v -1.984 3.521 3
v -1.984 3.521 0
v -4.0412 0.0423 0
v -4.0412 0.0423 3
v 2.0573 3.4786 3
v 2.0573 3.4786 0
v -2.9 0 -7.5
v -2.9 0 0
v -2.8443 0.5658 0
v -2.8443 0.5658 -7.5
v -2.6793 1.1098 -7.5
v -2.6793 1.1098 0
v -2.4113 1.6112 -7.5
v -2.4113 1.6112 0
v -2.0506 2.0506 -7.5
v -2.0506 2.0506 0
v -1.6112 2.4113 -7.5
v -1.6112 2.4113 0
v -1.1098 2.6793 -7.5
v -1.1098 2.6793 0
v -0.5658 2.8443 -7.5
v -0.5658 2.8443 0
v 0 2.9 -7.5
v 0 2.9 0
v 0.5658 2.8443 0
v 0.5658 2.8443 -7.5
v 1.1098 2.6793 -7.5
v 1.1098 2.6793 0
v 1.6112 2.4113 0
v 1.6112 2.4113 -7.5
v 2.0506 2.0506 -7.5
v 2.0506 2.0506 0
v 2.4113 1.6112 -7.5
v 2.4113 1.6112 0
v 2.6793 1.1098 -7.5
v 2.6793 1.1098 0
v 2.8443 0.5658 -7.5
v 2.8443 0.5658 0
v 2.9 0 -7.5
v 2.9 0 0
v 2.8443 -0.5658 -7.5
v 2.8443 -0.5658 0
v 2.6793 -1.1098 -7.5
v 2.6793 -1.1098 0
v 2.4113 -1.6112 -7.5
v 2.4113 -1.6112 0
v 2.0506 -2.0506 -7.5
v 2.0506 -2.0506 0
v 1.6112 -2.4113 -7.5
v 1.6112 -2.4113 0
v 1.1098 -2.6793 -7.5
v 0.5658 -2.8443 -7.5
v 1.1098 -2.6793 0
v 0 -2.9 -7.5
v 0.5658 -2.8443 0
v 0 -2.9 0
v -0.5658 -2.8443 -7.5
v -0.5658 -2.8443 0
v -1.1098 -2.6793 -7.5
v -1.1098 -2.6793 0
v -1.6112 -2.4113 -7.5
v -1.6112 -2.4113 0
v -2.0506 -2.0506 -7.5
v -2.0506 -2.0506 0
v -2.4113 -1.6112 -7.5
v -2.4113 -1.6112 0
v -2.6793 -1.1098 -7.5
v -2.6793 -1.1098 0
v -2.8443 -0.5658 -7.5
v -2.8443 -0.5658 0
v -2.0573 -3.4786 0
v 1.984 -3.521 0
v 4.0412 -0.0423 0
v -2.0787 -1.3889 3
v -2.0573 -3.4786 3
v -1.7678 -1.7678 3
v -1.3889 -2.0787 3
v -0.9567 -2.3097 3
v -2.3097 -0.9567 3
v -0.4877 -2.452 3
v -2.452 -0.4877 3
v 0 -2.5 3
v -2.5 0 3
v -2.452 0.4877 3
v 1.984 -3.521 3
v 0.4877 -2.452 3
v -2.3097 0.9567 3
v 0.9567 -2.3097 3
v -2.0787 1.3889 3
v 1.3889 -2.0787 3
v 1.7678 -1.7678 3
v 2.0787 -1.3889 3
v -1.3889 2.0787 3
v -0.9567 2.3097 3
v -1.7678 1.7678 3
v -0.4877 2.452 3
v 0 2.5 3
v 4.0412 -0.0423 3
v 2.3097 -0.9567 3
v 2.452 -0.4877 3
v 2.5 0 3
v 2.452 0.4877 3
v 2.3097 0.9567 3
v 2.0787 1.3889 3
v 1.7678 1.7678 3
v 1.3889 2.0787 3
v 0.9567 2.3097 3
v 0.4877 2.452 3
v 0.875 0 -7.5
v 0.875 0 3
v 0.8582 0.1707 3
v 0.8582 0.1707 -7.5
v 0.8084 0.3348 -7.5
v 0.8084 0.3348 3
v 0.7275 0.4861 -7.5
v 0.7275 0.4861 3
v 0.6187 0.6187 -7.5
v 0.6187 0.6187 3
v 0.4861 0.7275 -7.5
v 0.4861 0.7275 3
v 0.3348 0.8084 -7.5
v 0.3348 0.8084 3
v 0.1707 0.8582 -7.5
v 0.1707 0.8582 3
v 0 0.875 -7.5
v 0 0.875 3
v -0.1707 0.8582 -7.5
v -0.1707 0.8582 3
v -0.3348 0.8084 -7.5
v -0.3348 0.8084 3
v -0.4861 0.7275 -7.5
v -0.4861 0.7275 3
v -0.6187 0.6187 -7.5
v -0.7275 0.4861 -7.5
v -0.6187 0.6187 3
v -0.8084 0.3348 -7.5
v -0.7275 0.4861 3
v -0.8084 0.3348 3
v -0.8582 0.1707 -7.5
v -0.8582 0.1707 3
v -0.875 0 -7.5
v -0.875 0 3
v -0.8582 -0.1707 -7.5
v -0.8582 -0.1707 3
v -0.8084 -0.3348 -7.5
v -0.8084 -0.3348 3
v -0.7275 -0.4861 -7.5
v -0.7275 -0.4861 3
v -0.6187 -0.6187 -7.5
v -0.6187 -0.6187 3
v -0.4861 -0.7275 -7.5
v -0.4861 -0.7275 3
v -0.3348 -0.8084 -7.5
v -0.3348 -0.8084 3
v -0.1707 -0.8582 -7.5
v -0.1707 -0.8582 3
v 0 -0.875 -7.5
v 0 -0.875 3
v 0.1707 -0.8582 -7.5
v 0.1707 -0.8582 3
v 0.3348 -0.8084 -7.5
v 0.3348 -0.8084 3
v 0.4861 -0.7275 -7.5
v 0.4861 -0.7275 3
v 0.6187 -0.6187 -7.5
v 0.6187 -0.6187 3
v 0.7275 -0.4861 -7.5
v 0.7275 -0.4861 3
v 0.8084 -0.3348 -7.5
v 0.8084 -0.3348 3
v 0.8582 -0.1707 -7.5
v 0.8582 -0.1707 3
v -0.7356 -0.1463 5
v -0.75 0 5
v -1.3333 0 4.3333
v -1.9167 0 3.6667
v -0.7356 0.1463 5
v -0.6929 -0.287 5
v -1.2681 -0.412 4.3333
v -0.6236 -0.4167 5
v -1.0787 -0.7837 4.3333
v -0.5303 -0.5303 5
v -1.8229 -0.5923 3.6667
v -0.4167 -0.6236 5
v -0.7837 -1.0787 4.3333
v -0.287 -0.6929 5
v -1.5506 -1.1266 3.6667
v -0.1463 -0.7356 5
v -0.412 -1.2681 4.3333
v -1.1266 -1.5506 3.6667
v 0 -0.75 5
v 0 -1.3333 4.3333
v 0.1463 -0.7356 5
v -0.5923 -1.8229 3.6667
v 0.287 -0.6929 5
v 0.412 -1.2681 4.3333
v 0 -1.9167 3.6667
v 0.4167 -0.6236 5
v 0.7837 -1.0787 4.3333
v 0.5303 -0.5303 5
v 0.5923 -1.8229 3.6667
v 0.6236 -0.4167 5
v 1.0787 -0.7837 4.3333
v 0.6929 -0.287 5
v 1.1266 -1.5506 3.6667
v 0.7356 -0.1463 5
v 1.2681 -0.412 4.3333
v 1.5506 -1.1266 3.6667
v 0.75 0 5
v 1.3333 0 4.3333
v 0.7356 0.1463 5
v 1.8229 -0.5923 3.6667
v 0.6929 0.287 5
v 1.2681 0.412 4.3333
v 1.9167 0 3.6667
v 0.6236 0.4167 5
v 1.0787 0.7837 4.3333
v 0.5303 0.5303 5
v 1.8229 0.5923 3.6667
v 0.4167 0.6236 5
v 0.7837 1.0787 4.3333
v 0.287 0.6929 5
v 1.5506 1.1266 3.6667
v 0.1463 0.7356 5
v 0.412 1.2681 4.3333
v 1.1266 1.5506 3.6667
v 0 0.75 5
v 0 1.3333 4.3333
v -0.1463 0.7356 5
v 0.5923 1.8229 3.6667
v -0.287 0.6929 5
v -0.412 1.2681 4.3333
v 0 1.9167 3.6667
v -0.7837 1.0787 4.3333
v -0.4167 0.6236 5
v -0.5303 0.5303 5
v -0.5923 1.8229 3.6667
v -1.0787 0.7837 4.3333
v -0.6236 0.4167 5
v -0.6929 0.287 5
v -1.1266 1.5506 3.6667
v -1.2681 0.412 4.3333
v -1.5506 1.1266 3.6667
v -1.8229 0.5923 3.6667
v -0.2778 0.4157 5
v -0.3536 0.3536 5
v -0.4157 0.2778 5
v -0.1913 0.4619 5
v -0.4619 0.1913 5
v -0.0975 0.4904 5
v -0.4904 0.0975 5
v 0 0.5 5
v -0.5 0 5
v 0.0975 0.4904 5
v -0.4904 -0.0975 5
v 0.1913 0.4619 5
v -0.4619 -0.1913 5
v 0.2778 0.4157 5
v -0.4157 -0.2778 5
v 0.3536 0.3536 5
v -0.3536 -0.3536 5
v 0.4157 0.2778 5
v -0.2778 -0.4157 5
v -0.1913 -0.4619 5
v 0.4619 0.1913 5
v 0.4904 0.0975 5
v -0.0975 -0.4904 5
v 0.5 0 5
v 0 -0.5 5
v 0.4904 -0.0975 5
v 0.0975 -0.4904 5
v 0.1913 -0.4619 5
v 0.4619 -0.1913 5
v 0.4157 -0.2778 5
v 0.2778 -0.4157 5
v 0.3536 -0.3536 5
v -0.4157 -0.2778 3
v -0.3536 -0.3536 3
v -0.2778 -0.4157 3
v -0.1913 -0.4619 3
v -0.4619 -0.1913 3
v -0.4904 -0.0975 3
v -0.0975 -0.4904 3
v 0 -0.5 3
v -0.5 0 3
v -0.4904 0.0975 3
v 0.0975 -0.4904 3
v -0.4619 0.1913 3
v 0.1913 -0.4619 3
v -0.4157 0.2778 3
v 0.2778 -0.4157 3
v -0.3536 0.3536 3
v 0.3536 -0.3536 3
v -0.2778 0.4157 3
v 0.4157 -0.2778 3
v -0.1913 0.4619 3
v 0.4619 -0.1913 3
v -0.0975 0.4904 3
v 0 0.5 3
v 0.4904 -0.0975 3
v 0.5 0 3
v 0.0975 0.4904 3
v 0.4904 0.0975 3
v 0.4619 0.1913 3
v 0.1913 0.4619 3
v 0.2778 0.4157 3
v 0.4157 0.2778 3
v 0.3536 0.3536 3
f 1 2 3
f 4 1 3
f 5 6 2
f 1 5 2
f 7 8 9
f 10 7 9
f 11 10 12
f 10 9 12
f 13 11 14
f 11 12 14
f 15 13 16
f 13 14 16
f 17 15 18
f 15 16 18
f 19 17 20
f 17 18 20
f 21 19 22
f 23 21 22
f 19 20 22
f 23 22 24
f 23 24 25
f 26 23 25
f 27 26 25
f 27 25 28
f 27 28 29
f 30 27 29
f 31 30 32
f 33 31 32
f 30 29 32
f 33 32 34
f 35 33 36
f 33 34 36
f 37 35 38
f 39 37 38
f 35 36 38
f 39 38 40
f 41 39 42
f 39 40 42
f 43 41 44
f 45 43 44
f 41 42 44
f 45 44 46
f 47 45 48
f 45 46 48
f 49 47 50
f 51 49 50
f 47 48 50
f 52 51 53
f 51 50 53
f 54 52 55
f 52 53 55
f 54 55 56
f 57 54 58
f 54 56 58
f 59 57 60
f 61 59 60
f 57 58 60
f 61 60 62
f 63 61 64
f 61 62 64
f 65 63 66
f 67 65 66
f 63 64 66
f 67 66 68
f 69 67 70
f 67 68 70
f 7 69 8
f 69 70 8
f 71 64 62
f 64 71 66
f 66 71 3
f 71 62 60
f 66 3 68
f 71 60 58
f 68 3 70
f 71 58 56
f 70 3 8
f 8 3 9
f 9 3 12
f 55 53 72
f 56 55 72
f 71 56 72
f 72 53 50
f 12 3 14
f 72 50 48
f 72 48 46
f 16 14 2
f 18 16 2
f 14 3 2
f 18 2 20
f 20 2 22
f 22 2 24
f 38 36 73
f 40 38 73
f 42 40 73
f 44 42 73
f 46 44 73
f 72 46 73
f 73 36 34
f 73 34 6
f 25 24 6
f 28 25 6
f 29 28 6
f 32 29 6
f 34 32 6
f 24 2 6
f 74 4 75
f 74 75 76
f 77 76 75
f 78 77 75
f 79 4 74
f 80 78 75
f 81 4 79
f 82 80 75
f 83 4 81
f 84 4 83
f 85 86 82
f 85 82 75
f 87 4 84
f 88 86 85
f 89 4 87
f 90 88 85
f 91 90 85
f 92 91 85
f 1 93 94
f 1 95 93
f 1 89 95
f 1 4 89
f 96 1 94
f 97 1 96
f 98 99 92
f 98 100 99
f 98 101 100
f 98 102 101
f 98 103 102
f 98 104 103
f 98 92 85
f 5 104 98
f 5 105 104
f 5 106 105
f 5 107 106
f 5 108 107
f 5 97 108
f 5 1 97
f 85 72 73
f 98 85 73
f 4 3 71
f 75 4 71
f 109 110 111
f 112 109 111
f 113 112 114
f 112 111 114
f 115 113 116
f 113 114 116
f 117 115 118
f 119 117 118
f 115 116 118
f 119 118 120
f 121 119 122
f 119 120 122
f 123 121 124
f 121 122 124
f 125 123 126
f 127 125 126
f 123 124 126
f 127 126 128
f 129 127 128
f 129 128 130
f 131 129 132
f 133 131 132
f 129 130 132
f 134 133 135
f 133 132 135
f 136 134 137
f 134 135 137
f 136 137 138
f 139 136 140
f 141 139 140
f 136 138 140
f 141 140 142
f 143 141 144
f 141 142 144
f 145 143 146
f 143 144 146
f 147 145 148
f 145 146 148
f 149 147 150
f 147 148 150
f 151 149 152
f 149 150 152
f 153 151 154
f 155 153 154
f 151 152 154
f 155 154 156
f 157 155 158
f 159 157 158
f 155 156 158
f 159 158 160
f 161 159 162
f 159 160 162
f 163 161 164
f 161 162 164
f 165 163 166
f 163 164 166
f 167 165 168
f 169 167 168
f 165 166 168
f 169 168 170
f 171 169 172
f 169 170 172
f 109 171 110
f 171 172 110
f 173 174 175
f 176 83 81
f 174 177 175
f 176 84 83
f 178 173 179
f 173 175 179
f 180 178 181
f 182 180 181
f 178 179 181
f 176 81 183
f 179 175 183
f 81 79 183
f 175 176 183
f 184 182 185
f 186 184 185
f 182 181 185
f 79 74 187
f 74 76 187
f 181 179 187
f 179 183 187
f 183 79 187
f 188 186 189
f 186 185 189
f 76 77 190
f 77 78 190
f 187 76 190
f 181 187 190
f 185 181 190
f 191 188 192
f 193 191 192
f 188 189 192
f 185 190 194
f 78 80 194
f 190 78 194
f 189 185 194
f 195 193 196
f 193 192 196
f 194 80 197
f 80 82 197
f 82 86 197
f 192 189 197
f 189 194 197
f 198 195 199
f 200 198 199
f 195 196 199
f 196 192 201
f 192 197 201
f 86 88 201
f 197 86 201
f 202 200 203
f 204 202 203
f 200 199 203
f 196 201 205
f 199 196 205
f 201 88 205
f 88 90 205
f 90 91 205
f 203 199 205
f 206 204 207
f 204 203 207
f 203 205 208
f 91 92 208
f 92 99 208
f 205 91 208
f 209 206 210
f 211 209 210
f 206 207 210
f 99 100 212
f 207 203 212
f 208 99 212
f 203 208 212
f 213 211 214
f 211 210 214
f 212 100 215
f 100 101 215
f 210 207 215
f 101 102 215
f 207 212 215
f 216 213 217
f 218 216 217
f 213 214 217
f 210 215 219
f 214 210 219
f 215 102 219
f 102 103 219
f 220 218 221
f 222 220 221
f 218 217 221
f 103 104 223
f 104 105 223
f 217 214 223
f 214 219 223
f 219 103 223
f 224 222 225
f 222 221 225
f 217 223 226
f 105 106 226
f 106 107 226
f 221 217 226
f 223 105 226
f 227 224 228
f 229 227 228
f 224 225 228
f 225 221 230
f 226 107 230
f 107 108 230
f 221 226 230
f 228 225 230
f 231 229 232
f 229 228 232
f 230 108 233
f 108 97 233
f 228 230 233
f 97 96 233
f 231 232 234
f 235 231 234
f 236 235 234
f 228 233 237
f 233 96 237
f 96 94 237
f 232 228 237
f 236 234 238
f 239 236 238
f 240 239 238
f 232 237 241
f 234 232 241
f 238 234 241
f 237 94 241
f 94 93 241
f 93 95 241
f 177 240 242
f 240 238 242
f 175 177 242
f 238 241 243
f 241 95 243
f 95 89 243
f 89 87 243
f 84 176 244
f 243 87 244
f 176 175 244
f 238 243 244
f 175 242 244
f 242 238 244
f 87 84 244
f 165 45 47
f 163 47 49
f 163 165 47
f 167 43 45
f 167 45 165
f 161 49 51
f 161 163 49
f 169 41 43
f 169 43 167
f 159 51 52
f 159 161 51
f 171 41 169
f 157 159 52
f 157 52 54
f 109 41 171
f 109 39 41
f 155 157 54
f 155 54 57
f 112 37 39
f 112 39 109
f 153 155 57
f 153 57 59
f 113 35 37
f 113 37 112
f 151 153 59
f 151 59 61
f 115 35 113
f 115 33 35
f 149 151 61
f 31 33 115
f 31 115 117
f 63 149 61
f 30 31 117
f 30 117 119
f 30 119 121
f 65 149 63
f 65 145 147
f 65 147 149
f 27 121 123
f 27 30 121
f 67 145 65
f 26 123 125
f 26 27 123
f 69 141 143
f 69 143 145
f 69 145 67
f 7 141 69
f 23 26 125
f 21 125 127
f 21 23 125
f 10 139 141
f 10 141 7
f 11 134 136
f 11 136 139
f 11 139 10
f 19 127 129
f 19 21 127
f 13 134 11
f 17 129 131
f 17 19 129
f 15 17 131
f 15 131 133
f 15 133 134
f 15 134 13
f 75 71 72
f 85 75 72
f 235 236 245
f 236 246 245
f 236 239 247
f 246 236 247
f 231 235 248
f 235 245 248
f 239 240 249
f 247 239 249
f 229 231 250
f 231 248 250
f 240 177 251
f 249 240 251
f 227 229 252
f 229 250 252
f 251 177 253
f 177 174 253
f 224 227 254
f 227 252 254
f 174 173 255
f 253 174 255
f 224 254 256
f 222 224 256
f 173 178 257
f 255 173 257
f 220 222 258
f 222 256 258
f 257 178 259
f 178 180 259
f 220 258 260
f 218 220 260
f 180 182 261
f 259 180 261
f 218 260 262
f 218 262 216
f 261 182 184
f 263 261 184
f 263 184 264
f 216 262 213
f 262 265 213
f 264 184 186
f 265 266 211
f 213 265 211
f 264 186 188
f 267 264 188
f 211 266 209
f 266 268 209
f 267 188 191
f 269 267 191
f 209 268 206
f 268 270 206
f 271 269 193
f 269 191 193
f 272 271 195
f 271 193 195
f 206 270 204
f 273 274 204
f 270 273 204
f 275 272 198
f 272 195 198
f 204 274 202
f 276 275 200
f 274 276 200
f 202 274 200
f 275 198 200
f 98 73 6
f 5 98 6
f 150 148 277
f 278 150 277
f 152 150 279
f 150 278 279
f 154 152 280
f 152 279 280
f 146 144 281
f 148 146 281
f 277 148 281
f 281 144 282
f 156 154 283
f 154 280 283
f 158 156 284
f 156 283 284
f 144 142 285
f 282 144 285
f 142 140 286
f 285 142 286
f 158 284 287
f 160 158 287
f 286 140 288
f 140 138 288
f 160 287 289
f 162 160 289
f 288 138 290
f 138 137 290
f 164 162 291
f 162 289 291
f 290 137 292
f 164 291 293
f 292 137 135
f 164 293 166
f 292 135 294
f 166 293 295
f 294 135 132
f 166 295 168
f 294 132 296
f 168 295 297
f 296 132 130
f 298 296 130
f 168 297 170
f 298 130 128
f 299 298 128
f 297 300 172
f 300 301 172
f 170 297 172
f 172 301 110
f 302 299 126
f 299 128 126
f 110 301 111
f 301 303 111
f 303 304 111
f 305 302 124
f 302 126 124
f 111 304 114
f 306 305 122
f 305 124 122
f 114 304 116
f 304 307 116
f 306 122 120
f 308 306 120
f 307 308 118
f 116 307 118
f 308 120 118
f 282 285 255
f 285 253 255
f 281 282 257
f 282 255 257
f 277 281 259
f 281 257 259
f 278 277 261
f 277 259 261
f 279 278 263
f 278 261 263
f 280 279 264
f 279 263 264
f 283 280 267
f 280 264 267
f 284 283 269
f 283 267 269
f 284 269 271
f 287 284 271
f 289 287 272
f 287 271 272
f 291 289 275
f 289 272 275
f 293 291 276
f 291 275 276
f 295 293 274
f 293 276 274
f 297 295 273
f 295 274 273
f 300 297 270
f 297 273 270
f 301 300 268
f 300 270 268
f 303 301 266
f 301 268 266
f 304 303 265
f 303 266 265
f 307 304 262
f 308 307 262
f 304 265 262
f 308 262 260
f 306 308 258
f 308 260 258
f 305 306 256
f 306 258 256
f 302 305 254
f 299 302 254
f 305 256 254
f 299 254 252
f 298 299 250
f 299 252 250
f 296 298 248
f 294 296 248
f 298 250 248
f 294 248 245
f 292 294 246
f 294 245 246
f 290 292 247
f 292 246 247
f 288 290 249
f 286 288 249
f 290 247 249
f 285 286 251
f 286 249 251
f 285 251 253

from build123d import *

# Parameters (mm, degrees)
SALIENTE_EXTRUIR1_DEPTH = 3
CROQUIS5_R              = 2.9
SALIENTE_EXTRUIR2_DEPTH = 7.5
CROQUIS4_R              = 0.875
CORTAR_EXTRUIR1_DEPTH   = 10.5


with BuildPart() as part:
    # Croquis1 → Saliente-Extruir1 (new body)
    with BuildSketch(Plane.XY):
        Polygon((-2.057275574, -3.478642055), (1.983954604, -3.520973937), (4.041230177, -0.042331882), (2.057275574, 3.478642055), (-1.983954604, 3.520973937), (-4.041230177, 0.042331882), align=None)
    extrude(amount=SALIENTE_EXTRUIR1_DEPTH)

    # Croquis3 → Revolución1 (revolve)
    with BuildSketch(Plane(origin=(0, 0, 0), x_dir=(1, 0, 0), z_dir=(0, 1, 0))):
        Polygon((-0.5, -5), (-0.75, -5), (-2.5, -3), (-0.5, -3), align=None)
    revolve(axis=Axis((0, 0, 0), (0, 0, 1)))

    # Croquis5 → Saliente-Extruir2 (add)
    with BuildSketch(Plane(origin=(0, 0, 0), x_dir=(-1, 0, 0), z_dir=(0, 0, -1))):
        Circle(CROQUIS5_R)
    extrude(amount=SALIENTE_EXTRUIR2_DEPTH)

    # Croquis4 → Cortar-Extruir1 (cut)
    with BuildSketch(Plane.XY.offset(3)):
        Circle(CROQUIS4_R)
    extrude(amount=-CORTAR_EXTRUIR1_DEPTH, mode=Mode.SUBTRACT)


solid = part.part
